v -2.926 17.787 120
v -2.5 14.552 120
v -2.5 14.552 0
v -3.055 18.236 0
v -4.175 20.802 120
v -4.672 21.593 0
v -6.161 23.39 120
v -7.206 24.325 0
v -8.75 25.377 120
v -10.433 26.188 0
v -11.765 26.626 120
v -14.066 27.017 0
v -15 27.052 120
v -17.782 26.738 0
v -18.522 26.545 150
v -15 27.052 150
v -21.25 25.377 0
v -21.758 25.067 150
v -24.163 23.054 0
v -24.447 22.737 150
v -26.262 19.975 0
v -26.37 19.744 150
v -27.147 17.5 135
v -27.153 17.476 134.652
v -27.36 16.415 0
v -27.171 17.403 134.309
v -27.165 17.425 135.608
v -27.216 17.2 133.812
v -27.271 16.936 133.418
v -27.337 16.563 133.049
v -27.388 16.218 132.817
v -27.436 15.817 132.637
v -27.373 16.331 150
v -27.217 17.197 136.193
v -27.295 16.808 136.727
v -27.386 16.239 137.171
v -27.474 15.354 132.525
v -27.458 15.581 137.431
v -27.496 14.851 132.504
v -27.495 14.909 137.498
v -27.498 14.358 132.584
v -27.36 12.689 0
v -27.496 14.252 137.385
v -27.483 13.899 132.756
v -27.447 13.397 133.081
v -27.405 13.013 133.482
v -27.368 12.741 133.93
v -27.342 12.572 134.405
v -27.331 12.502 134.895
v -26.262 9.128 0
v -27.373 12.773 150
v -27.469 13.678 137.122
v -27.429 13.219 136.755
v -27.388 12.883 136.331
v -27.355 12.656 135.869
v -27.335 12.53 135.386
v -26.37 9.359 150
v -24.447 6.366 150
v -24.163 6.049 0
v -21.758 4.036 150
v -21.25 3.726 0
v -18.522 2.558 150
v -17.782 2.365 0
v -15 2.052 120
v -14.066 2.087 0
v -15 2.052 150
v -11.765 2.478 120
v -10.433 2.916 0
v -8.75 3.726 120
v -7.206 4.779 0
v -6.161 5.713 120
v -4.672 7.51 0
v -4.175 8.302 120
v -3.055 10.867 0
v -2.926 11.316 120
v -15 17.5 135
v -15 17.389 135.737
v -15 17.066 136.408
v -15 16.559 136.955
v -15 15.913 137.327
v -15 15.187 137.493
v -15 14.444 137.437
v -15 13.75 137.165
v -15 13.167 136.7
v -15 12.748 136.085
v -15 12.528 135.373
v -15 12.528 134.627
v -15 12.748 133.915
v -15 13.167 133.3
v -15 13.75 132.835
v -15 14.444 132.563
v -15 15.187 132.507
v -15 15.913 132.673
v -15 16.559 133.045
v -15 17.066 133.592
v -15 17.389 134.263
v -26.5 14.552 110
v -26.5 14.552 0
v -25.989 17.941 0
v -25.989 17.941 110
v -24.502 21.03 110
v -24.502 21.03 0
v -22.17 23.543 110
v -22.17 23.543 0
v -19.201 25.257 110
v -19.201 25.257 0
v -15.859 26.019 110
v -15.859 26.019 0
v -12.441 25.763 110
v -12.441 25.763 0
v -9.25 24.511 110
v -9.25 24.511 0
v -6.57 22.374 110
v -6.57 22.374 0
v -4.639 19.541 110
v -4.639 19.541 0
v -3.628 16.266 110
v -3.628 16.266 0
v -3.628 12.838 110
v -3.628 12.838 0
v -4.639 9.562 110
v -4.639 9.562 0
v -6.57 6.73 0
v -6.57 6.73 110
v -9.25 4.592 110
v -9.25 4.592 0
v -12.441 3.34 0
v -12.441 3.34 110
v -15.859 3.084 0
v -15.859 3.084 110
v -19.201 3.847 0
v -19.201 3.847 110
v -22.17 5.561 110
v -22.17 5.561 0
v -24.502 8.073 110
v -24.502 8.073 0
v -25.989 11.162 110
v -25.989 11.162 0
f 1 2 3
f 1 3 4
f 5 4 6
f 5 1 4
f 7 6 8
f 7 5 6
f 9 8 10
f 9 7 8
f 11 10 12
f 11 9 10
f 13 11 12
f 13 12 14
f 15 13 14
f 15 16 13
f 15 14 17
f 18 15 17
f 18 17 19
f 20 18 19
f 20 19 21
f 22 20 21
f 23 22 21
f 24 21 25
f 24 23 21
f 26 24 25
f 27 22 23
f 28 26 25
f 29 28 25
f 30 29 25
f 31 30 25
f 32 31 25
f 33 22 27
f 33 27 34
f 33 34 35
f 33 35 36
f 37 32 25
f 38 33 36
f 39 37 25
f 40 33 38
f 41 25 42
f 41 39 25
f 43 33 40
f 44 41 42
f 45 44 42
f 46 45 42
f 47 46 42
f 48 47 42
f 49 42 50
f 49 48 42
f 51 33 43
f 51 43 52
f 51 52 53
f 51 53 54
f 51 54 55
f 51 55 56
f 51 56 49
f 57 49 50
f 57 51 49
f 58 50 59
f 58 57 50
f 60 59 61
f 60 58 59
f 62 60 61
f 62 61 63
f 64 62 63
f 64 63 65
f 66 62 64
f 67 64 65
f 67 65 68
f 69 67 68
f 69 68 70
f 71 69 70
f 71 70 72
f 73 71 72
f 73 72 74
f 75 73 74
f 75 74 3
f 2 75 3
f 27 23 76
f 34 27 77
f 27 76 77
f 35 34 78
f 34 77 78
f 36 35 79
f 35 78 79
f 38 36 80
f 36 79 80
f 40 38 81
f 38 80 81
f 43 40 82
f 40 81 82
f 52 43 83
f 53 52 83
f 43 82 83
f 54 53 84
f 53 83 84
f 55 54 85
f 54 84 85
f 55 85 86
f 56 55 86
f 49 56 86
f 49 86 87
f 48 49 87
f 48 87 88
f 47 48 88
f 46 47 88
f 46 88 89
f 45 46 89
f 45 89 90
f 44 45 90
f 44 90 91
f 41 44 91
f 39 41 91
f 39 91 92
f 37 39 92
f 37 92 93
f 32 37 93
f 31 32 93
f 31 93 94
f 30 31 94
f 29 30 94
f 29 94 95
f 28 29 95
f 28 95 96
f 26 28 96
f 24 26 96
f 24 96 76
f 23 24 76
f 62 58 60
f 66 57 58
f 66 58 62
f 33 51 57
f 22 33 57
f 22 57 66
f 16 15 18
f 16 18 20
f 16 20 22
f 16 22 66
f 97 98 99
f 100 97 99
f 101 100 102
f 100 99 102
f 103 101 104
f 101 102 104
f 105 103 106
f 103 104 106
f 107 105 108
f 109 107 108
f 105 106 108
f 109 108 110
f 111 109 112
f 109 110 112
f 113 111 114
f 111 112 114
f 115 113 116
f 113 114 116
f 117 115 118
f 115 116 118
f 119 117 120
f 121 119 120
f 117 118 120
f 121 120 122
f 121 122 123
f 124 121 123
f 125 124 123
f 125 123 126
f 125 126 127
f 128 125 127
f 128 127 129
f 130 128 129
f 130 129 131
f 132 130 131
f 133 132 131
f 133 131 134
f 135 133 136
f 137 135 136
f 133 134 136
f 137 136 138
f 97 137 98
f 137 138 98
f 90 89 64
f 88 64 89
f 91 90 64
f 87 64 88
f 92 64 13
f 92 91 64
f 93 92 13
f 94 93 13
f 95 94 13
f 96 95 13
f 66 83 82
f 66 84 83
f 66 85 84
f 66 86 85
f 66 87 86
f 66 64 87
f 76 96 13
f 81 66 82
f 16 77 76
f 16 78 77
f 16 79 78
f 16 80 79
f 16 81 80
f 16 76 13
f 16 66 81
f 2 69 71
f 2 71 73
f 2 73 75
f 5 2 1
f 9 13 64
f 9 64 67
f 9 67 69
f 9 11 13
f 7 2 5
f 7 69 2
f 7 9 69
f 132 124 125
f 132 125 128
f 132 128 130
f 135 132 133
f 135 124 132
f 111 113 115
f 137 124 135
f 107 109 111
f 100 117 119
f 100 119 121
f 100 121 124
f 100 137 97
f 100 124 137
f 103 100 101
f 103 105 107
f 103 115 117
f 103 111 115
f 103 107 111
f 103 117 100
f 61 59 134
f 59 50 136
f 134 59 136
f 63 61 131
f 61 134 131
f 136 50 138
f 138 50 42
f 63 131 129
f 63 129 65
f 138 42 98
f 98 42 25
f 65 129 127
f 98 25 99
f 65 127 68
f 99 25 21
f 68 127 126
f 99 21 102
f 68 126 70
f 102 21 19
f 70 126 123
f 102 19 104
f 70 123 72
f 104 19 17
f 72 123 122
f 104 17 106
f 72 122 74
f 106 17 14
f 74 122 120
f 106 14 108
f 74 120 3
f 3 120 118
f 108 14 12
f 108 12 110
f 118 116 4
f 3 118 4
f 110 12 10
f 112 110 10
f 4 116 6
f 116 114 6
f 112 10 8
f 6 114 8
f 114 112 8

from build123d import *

# Parameters (mm, degrees)
SKETCH2_W           = 30
SKETCH2_H           = 30
BOSS_EXTRUDE2_DEPTH = 150
SKETCH3_R           = 2.5
CUT_EXTRUDE1_DEPTH  = 30
SKETCH4_OUTSIDE_W   = 63.176
SKETCH4_OUTSIDE_H   = 63.176
SKETCH4_OUTSIDE_R   = 12.5
CUT_EXTRUDE2_DEPTH  = 150
SKETCH5_R           = 11.5
CUT_EXTRUDE3_DEPTH  = 110
SKETCH7_W           = 12.5
SKETCH7_H           = 25
CUT_EXTRUDE4_DEPTH  = 30


with BuildPart() as part:
    # Sketch2 → Boss-Extrude2 (new body)
    with BuildSketch(Plane.XY):
        with Locations((-15, 15)):
            Rectangle(SKETCH2_W, SKETCH2_H)
    extrude(amount=BOSS_EXTRUDE2_DEPTH)

    # Sketch3 → Cut-Extrude1 (cut)
    with BuildSketch(Plane(origin=(0, 0, 0), x_dir=(0, 0, -1), z_dir=(1, 0, 0))):
        with Locations((-135, 15)):
            Circle(SKETCH3_R)
    extrude(amount=-CUT_EXTRUDE1_DEPTH, mode=Mode.SUBTRACT)

    # Sketch4 outside → Cut-Extrude2 (cut)
    with BuildSketch(Plane.XY.offset(150)):
        with Locations((-15, 15)):
            Rectangle(SKETCH4_OUTSIDE_W, SKETCH4_OUTSIDE_H)
        with Locations((-15, 14.551643442)):
            Circle(SKETCH4_OUTSIDE_R, mode=Mode.SUBTRACT)
    extrude(amount=-CUT_EXTRUDE2_DEPTH, mode=Mode.SUBTRACT)

    # Sketch5 → Cut-Extrude3 (cut)
    with BuildSketch(Plane(origin=(0, 0, 0), x_dir=(-1, 0, 0), z_dir=(0, 0, -1))):
        with Locations((15, 14.551643442)):
            Circle(SKETCH5_R)
    extrude(amount=-CUT_EXTRUDE3_DEPTH, mode=Mode.SUBTRACT)

    # Sketch7 → Cut-Extrude4 (cut)
    with BuildSketch(Plane.XY.offset(150)):
        with Locations((-8.75, 14.551643442)):
            Rectangle(SKETCH7_W, SKETCH7_H)
    extrude(amount=-CUT_EXTRUDE4_DEPTH, mode=Mode.SUBTRACT)


solid = part.part
